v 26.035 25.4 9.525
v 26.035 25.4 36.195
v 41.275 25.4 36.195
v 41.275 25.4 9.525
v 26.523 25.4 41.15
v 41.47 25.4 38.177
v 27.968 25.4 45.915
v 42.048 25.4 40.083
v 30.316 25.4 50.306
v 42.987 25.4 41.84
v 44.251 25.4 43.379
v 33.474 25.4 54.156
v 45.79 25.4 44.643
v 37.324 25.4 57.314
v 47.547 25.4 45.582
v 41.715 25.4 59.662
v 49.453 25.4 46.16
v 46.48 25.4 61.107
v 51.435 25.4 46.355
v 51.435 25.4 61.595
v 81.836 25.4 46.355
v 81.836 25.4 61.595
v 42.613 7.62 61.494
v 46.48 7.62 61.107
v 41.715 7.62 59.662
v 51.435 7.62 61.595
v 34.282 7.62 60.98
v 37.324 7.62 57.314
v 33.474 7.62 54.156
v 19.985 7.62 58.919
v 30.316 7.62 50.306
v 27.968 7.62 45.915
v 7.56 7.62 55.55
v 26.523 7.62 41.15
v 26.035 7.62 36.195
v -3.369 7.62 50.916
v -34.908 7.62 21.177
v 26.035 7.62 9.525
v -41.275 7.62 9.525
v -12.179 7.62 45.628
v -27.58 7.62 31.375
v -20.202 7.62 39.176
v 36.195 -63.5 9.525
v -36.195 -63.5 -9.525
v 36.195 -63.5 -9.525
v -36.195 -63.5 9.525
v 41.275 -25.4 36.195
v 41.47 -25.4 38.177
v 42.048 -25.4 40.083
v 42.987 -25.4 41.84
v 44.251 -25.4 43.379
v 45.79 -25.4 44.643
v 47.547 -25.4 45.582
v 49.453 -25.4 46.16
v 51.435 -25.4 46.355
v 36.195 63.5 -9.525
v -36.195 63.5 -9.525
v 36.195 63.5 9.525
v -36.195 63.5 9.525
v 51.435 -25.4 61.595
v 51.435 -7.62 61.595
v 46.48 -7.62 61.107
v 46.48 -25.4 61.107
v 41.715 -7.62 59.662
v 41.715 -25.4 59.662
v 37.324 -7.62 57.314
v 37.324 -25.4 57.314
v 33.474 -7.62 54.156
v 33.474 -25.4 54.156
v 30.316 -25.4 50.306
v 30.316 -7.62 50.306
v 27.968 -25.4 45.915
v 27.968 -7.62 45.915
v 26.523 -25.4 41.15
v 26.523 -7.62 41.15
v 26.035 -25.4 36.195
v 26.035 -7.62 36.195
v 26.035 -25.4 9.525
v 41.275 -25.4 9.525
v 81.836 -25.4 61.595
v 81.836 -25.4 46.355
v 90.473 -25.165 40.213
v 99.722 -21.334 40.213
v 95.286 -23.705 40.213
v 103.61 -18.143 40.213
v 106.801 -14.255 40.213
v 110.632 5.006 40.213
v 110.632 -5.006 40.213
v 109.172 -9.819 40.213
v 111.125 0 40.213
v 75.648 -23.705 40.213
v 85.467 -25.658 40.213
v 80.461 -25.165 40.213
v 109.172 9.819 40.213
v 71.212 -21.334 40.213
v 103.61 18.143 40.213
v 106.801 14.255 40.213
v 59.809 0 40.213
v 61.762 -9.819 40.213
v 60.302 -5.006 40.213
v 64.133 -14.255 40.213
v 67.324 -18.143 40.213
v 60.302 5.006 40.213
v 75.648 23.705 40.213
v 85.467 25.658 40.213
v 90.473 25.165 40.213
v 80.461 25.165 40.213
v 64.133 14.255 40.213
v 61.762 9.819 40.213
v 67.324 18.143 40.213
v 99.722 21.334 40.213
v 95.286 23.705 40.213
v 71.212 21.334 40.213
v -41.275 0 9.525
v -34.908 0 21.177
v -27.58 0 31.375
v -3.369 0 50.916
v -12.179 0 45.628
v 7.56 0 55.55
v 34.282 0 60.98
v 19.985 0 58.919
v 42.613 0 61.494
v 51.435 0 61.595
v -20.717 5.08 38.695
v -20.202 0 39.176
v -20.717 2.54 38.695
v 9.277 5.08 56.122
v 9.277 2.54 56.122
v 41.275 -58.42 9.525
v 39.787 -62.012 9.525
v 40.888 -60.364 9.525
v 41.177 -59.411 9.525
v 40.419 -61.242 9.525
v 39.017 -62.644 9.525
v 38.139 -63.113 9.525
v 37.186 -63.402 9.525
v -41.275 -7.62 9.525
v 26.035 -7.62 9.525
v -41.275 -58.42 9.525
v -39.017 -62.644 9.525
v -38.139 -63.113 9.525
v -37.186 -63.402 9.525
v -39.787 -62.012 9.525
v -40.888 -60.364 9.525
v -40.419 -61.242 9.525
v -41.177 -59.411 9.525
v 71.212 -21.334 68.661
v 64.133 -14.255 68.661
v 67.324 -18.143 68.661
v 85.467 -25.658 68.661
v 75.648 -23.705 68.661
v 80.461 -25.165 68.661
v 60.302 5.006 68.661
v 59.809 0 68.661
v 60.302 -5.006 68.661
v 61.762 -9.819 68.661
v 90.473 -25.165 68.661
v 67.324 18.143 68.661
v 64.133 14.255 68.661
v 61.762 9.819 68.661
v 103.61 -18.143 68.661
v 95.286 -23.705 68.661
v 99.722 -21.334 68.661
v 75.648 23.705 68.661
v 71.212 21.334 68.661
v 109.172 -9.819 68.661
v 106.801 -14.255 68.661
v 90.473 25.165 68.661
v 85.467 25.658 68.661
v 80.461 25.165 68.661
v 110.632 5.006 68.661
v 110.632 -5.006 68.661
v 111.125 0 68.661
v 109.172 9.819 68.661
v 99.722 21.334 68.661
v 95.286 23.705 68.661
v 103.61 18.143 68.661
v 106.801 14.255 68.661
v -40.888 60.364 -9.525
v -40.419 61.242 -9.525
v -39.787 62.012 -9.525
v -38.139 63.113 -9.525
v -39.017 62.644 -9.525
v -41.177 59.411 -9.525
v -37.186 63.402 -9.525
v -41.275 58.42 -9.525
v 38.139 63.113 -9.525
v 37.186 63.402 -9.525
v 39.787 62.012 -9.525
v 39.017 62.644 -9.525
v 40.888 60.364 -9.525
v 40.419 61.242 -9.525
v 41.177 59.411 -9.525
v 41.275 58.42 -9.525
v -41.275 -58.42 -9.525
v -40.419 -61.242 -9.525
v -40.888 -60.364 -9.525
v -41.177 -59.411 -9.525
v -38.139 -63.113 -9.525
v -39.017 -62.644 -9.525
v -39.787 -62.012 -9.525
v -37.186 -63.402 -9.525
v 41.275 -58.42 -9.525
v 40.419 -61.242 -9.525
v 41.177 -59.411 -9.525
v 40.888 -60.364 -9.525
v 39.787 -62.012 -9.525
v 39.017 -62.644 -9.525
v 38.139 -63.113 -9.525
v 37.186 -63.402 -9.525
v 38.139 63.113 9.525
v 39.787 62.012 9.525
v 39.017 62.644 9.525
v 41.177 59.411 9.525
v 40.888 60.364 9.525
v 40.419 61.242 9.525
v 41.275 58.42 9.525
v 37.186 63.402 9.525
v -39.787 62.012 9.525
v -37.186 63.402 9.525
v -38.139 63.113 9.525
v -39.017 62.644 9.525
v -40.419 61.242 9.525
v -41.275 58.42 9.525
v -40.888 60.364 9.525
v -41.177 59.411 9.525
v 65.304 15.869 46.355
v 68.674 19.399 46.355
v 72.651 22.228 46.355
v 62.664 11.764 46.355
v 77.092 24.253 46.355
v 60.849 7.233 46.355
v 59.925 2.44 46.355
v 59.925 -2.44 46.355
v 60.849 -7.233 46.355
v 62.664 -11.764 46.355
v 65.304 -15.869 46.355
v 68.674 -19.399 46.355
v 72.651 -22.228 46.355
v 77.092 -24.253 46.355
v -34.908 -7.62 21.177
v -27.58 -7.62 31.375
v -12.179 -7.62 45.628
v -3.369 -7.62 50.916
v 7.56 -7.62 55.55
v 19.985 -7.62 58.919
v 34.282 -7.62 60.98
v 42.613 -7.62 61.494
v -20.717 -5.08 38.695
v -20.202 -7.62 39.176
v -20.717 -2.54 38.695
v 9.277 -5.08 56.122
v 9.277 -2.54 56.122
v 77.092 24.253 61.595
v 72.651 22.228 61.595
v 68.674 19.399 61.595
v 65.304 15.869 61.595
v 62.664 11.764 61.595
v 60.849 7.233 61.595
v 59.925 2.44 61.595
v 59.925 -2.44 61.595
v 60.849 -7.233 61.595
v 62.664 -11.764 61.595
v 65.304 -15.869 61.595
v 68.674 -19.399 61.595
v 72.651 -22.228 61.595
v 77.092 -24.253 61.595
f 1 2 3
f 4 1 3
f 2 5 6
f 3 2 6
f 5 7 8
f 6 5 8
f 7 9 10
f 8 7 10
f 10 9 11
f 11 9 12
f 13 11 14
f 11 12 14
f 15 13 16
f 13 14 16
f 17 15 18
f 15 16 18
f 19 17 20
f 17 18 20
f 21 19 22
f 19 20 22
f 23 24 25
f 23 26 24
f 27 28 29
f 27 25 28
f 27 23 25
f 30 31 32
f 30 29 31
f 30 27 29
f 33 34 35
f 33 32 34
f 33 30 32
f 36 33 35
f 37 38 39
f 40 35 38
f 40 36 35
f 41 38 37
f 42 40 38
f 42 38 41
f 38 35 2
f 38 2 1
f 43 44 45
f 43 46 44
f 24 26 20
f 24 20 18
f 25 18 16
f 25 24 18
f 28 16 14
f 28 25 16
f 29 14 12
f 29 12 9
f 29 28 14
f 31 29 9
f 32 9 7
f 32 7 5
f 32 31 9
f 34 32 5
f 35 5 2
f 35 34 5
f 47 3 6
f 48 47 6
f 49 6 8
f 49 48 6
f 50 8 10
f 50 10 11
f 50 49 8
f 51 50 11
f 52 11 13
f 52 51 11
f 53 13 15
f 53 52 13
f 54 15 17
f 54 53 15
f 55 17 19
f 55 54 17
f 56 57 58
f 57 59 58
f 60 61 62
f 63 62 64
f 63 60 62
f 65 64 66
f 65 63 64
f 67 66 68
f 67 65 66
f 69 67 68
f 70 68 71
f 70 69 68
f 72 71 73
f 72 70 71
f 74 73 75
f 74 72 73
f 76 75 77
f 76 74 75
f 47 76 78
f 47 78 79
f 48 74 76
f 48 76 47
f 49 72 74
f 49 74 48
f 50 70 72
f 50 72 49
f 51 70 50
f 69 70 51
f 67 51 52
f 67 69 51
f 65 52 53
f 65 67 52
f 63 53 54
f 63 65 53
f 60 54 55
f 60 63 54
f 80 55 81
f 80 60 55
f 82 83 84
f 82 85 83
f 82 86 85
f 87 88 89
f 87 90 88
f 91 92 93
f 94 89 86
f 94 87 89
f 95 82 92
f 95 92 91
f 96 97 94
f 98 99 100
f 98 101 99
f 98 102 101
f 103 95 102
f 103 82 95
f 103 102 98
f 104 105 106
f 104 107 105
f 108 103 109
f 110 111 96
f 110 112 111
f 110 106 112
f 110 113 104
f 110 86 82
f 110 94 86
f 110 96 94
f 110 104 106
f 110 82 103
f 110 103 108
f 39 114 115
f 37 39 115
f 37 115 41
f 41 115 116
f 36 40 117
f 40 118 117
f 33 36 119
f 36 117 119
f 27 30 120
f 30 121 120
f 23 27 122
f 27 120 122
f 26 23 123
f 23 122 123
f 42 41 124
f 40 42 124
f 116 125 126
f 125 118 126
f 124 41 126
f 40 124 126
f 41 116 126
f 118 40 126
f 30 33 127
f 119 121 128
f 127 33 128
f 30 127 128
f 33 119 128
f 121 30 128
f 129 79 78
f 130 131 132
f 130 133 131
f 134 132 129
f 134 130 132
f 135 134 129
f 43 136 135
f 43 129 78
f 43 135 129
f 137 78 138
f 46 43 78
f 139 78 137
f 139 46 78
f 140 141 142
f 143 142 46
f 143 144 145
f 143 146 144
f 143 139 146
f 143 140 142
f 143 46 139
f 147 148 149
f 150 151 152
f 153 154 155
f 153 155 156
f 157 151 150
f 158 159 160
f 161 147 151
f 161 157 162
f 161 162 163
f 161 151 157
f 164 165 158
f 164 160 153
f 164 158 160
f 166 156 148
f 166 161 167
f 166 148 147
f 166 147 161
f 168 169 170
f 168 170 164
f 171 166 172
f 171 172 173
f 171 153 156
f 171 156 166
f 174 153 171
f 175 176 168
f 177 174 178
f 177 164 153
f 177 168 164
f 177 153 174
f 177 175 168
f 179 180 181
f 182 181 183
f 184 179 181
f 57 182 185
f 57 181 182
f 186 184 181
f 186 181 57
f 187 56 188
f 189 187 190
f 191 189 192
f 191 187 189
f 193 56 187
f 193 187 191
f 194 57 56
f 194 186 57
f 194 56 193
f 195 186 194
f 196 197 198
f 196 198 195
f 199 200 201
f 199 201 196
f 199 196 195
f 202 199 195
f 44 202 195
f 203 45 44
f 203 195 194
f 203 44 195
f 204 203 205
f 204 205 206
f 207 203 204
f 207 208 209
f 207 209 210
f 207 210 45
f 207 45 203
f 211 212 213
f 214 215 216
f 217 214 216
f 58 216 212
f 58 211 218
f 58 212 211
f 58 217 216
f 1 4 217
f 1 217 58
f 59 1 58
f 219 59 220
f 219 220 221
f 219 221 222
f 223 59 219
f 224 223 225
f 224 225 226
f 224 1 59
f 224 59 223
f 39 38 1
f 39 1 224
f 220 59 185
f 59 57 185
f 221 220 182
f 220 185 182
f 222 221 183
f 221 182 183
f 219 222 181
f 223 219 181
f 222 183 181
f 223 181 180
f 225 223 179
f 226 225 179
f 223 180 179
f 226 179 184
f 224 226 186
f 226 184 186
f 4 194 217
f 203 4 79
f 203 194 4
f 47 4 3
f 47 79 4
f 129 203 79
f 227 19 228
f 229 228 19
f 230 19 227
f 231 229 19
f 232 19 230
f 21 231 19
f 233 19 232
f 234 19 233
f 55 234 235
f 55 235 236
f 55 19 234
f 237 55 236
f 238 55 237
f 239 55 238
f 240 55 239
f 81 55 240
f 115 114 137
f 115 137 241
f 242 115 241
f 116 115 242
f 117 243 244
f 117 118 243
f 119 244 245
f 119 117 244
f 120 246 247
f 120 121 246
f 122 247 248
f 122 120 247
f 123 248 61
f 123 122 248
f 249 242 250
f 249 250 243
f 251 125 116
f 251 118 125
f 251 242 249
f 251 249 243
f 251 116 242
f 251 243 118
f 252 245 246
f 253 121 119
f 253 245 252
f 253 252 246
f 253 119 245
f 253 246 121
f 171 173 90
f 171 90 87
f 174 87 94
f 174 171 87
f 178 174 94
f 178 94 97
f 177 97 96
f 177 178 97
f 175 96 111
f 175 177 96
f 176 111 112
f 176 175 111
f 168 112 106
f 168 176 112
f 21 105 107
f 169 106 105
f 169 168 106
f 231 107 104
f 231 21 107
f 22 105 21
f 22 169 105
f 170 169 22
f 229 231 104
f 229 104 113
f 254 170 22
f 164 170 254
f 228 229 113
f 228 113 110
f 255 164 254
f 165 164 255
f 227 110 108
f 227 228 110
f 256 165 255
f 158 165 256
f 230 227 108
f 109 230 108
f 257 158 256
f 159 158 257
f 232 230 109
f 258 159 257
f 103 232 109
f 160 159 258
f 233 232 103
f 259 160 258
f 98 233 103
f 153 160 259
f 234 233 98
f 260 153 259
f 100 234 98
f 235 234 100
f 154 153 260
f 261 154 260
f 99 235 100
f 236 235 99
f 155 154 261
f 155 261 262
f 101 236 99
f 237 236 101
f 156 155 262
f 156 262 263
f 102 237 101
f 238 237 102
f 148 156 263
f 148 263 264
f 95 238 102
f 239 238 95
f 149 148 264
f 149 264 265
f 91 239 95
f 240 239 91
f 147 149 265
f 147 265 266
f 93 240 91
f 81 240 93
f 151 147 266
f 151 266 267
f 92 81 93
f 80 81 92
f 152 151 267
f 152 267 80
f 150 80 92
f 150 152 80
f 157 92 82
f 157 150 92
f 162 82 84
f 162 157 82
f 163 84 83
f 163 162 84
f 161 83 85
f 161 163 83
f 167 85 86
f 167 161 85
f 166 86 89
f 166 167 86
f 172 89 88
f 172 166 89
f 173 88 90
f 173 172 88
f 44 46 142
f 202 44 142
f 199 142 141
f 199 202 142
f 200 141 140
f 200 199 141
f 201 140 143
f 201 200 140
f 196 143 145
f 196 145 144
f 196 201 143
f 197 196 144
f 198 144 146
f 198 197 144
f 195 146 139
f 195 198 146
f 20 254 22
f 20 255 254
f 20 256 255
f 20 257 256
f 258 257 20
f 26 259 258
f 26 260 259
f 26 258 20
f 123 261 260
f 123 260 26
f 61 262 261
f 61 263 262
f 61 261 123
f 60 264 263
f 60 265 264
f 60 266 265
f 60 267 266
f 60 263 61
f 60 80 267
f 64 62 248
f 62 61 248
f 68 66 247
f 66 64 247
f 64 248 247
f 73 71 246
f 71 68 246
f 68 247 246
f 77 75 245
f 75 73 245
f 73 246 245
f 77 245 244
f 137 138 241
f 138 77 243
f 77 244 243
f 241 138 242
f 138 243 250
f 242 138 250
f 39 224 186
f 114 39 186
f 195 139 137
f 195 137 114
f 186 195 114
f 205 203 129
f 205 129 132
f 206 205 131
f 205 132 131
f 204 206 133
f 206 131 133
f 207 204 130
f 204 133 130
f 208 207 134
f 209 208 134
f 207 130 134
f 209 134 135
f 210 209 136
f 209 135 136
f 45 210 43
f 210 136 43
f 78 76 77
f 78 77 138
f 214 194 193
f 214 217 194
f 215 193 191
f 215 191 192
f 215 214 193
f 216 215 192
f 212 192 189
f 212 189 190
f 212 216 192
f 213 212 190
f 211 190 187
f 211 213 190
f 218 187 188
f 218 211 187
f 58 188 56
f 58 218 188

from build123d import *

# Parameters (mm, degrees)
F1_DEPTH = 63.5
F0_W     = 25.1418616311
F0_H     = 15.24
F2_DEPTH = 25.4
F3_DEPTH = 7.62
F5_R     = 5.08
F6_R     = 5.08
F7_R     = 5.08
F8_R     = 5.08


with BuildPart() as f1:
    # F0 (on Front) → F1 (new body, symmetric)
    with BuildSketch(Plane.XZ):
        Polygon((-41.275, -9.525), (41.275, -9.525), (41.275, 9.525), (26.035, 9.525), (-41.275, 9.525), align=None)
    extrude(amount=F1_DEPTH, both=True)

    # F0 (on Front) → F2 (join, symmetric)
    with BuildSketch(Plane.XZ):
        with BuildLine():
            Line((26.035, 9.525), (41.275, 9.525))
            Line((41.275, 9.525), (41.275, 36.195))
            ThreePointArc((41.275, 36.195), (44.2507951031, 43.3792048969), (51.435, 46.355))
            Line((51.435, 46.355), (60.325, 46.355))
            Line((60.325, 46.355), (60.325, 61.595))
            Line((60.325, 61.595), (51.435, 61.595))
            ThreePointArc((51.435, 61.595), (33.4744877579, 54.1555122421), (26.035, 36.195))
            Line((26.035, 36.195), (26.035, 9.525))
        make_face()
        with Locations((72.8959308155, 53.975)):
            Rectangle(F0_W, F0_H)
    extrude(amount=F2_DEPTH, both=True)

    # F0 (on Front) → F3 (join, symmetric)
    with BuildSketch(Plane.XZ):
        with BuildLine():
            add(Edge.make_bspline(
                [(-41.275, 9.525), (-24.5270843474, 44.4972960267), (2.2869093497, 62.1685317942), (51.435, 61.595)],
                knots=[0, 0, 0, 0, 106.3316932998, 106.3316932998, 106.3316932998, 106.3316932998], degree=3))
            Line((-41.275, 9.525), (26.035, 9.525))
            Line((26.035, 9.525), (26.035, 36.195))
            ThreePointArc((26.035, 36.195), (33.4744877579, 54.1555122421), (51.435, 61.595))
        make_face()
    extrude(amount=F3_DEPTH, both=True)

    # F0 (on Front) → F4 (revolve)
    with BuildSketch(Plane.XZ):
        Polygon((85.4668616311, 68.6612712564), (85.4668616311, 61.595), (85.4668616311, 46.355), (85.4668616311, 40.2132712564), (111.125, 40.2132712564), (111.125, 68.6612712564), align=None)
    revolve(axis=Axis((85.4668616311, 0, 57.5081356282), (0, 0, 1)))

    # F5
    f5_edges = [f1.edges().sort_by_distance(p)[0] for p in [
        (41.275, -63.5, 0),
    ]]
    fillet(f5_edges, radius=F5_R)

    # F6
    f6_edges = [f1.edges().sort_by_distance(p)[0] for p in [
        (-41.275, -63.5, 0),
    ]]
    fillet(f6_edges, radius=F6_R)

    # F7
    f7_edges = [f1.edges().sort_by_distance(p)[0] for p in [
        (41.275, 63.5, 0),
    ]]
    fillet(f7_edges, radius=F7_R)

    # F8
    f8_edges = [f1.edges().sort_by_distance(p)[0] for p in [
        (-41.275, 63.5, 0),
    ]]
    fillet(f8_edges, radius=F8_R)


solid = f1.part
